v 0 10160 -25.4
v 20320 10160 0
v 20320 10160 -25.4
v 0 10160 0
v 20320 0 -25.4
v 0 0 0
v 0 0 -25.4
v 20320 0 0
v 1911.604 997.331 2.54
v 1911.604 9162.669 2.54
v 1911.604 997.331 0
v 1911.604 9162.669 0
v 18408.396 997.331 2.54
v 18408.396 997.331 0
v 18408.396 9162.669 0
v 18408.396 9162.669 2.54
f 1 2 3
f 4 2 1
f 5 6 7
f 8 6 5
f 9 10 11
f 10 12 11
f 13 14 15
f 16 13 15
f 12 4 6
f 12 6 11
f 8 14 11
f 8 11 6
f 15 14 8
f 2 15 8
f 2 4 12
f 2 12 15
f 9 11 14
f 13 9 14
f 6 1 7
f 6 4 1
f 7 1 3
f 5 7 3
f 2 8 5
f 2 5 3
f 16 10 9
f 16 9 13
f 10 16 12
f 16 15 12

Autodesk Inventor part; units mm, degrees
ref_plane "YZ Plane" through (0, 0, 0) normal (1, 0, 0) x (0, 1, 0)
ref_plane "XZ Plane" through (0, 0, 0) normal (0, 1, 0) x (-1, 0, 0)
ref_plane "XY Plane" through (0, 0, 0) normal (0, 0, 1) x (1, 0, 0)
sketch "Sketch1" plane through (0, 0, 0) normal (0, 0, 1) x (1, 0, 0)
  line L0 (0, 0) -> (20320, 0)
  line L1 (20320, 0) -> (20320, 10160)
  line L2 (20320, 10160) -> (0, 10160)
  line L3 (0, 10160) -> (0, 0)
  dimension "d0" = 20320
  dimension "d1" = 10160
extrude "Extrusion1" add sketch "Sketch1" against normal blind 25.4
sketch "Sketch2" plane through (0, 0, 0) normal (0, 0, 1) x (1, 0, 0)
  line L0 (20320, 10160) -> (0, 10160) projected
  line L1 (0, 10160) -> (0, 0) projected
  line L2 (1911.604, 997.331) -> (18408.396, 997.331)
  line L3 (18408.396, 997.331) -> (18408.396, 9162.669)
  line L4 (18408.396, 9162.669) -> (1911.604, 9162.669)
  line L5 (1911.604, 9162.669) -> (1911.604, 997.331)
  point P0 (1911.604, 5080)
  point P1 (0, 5080)
  point P2 (10160, 9162.669)
  point P3 (10160, 10160)
  dimension "d4" = 16496.792
  dimension "d6" = 8165.338
extrude "Extrusion2" add sketch "Sketch2" along normal blind 2.54
properties part number "Arena Base"
